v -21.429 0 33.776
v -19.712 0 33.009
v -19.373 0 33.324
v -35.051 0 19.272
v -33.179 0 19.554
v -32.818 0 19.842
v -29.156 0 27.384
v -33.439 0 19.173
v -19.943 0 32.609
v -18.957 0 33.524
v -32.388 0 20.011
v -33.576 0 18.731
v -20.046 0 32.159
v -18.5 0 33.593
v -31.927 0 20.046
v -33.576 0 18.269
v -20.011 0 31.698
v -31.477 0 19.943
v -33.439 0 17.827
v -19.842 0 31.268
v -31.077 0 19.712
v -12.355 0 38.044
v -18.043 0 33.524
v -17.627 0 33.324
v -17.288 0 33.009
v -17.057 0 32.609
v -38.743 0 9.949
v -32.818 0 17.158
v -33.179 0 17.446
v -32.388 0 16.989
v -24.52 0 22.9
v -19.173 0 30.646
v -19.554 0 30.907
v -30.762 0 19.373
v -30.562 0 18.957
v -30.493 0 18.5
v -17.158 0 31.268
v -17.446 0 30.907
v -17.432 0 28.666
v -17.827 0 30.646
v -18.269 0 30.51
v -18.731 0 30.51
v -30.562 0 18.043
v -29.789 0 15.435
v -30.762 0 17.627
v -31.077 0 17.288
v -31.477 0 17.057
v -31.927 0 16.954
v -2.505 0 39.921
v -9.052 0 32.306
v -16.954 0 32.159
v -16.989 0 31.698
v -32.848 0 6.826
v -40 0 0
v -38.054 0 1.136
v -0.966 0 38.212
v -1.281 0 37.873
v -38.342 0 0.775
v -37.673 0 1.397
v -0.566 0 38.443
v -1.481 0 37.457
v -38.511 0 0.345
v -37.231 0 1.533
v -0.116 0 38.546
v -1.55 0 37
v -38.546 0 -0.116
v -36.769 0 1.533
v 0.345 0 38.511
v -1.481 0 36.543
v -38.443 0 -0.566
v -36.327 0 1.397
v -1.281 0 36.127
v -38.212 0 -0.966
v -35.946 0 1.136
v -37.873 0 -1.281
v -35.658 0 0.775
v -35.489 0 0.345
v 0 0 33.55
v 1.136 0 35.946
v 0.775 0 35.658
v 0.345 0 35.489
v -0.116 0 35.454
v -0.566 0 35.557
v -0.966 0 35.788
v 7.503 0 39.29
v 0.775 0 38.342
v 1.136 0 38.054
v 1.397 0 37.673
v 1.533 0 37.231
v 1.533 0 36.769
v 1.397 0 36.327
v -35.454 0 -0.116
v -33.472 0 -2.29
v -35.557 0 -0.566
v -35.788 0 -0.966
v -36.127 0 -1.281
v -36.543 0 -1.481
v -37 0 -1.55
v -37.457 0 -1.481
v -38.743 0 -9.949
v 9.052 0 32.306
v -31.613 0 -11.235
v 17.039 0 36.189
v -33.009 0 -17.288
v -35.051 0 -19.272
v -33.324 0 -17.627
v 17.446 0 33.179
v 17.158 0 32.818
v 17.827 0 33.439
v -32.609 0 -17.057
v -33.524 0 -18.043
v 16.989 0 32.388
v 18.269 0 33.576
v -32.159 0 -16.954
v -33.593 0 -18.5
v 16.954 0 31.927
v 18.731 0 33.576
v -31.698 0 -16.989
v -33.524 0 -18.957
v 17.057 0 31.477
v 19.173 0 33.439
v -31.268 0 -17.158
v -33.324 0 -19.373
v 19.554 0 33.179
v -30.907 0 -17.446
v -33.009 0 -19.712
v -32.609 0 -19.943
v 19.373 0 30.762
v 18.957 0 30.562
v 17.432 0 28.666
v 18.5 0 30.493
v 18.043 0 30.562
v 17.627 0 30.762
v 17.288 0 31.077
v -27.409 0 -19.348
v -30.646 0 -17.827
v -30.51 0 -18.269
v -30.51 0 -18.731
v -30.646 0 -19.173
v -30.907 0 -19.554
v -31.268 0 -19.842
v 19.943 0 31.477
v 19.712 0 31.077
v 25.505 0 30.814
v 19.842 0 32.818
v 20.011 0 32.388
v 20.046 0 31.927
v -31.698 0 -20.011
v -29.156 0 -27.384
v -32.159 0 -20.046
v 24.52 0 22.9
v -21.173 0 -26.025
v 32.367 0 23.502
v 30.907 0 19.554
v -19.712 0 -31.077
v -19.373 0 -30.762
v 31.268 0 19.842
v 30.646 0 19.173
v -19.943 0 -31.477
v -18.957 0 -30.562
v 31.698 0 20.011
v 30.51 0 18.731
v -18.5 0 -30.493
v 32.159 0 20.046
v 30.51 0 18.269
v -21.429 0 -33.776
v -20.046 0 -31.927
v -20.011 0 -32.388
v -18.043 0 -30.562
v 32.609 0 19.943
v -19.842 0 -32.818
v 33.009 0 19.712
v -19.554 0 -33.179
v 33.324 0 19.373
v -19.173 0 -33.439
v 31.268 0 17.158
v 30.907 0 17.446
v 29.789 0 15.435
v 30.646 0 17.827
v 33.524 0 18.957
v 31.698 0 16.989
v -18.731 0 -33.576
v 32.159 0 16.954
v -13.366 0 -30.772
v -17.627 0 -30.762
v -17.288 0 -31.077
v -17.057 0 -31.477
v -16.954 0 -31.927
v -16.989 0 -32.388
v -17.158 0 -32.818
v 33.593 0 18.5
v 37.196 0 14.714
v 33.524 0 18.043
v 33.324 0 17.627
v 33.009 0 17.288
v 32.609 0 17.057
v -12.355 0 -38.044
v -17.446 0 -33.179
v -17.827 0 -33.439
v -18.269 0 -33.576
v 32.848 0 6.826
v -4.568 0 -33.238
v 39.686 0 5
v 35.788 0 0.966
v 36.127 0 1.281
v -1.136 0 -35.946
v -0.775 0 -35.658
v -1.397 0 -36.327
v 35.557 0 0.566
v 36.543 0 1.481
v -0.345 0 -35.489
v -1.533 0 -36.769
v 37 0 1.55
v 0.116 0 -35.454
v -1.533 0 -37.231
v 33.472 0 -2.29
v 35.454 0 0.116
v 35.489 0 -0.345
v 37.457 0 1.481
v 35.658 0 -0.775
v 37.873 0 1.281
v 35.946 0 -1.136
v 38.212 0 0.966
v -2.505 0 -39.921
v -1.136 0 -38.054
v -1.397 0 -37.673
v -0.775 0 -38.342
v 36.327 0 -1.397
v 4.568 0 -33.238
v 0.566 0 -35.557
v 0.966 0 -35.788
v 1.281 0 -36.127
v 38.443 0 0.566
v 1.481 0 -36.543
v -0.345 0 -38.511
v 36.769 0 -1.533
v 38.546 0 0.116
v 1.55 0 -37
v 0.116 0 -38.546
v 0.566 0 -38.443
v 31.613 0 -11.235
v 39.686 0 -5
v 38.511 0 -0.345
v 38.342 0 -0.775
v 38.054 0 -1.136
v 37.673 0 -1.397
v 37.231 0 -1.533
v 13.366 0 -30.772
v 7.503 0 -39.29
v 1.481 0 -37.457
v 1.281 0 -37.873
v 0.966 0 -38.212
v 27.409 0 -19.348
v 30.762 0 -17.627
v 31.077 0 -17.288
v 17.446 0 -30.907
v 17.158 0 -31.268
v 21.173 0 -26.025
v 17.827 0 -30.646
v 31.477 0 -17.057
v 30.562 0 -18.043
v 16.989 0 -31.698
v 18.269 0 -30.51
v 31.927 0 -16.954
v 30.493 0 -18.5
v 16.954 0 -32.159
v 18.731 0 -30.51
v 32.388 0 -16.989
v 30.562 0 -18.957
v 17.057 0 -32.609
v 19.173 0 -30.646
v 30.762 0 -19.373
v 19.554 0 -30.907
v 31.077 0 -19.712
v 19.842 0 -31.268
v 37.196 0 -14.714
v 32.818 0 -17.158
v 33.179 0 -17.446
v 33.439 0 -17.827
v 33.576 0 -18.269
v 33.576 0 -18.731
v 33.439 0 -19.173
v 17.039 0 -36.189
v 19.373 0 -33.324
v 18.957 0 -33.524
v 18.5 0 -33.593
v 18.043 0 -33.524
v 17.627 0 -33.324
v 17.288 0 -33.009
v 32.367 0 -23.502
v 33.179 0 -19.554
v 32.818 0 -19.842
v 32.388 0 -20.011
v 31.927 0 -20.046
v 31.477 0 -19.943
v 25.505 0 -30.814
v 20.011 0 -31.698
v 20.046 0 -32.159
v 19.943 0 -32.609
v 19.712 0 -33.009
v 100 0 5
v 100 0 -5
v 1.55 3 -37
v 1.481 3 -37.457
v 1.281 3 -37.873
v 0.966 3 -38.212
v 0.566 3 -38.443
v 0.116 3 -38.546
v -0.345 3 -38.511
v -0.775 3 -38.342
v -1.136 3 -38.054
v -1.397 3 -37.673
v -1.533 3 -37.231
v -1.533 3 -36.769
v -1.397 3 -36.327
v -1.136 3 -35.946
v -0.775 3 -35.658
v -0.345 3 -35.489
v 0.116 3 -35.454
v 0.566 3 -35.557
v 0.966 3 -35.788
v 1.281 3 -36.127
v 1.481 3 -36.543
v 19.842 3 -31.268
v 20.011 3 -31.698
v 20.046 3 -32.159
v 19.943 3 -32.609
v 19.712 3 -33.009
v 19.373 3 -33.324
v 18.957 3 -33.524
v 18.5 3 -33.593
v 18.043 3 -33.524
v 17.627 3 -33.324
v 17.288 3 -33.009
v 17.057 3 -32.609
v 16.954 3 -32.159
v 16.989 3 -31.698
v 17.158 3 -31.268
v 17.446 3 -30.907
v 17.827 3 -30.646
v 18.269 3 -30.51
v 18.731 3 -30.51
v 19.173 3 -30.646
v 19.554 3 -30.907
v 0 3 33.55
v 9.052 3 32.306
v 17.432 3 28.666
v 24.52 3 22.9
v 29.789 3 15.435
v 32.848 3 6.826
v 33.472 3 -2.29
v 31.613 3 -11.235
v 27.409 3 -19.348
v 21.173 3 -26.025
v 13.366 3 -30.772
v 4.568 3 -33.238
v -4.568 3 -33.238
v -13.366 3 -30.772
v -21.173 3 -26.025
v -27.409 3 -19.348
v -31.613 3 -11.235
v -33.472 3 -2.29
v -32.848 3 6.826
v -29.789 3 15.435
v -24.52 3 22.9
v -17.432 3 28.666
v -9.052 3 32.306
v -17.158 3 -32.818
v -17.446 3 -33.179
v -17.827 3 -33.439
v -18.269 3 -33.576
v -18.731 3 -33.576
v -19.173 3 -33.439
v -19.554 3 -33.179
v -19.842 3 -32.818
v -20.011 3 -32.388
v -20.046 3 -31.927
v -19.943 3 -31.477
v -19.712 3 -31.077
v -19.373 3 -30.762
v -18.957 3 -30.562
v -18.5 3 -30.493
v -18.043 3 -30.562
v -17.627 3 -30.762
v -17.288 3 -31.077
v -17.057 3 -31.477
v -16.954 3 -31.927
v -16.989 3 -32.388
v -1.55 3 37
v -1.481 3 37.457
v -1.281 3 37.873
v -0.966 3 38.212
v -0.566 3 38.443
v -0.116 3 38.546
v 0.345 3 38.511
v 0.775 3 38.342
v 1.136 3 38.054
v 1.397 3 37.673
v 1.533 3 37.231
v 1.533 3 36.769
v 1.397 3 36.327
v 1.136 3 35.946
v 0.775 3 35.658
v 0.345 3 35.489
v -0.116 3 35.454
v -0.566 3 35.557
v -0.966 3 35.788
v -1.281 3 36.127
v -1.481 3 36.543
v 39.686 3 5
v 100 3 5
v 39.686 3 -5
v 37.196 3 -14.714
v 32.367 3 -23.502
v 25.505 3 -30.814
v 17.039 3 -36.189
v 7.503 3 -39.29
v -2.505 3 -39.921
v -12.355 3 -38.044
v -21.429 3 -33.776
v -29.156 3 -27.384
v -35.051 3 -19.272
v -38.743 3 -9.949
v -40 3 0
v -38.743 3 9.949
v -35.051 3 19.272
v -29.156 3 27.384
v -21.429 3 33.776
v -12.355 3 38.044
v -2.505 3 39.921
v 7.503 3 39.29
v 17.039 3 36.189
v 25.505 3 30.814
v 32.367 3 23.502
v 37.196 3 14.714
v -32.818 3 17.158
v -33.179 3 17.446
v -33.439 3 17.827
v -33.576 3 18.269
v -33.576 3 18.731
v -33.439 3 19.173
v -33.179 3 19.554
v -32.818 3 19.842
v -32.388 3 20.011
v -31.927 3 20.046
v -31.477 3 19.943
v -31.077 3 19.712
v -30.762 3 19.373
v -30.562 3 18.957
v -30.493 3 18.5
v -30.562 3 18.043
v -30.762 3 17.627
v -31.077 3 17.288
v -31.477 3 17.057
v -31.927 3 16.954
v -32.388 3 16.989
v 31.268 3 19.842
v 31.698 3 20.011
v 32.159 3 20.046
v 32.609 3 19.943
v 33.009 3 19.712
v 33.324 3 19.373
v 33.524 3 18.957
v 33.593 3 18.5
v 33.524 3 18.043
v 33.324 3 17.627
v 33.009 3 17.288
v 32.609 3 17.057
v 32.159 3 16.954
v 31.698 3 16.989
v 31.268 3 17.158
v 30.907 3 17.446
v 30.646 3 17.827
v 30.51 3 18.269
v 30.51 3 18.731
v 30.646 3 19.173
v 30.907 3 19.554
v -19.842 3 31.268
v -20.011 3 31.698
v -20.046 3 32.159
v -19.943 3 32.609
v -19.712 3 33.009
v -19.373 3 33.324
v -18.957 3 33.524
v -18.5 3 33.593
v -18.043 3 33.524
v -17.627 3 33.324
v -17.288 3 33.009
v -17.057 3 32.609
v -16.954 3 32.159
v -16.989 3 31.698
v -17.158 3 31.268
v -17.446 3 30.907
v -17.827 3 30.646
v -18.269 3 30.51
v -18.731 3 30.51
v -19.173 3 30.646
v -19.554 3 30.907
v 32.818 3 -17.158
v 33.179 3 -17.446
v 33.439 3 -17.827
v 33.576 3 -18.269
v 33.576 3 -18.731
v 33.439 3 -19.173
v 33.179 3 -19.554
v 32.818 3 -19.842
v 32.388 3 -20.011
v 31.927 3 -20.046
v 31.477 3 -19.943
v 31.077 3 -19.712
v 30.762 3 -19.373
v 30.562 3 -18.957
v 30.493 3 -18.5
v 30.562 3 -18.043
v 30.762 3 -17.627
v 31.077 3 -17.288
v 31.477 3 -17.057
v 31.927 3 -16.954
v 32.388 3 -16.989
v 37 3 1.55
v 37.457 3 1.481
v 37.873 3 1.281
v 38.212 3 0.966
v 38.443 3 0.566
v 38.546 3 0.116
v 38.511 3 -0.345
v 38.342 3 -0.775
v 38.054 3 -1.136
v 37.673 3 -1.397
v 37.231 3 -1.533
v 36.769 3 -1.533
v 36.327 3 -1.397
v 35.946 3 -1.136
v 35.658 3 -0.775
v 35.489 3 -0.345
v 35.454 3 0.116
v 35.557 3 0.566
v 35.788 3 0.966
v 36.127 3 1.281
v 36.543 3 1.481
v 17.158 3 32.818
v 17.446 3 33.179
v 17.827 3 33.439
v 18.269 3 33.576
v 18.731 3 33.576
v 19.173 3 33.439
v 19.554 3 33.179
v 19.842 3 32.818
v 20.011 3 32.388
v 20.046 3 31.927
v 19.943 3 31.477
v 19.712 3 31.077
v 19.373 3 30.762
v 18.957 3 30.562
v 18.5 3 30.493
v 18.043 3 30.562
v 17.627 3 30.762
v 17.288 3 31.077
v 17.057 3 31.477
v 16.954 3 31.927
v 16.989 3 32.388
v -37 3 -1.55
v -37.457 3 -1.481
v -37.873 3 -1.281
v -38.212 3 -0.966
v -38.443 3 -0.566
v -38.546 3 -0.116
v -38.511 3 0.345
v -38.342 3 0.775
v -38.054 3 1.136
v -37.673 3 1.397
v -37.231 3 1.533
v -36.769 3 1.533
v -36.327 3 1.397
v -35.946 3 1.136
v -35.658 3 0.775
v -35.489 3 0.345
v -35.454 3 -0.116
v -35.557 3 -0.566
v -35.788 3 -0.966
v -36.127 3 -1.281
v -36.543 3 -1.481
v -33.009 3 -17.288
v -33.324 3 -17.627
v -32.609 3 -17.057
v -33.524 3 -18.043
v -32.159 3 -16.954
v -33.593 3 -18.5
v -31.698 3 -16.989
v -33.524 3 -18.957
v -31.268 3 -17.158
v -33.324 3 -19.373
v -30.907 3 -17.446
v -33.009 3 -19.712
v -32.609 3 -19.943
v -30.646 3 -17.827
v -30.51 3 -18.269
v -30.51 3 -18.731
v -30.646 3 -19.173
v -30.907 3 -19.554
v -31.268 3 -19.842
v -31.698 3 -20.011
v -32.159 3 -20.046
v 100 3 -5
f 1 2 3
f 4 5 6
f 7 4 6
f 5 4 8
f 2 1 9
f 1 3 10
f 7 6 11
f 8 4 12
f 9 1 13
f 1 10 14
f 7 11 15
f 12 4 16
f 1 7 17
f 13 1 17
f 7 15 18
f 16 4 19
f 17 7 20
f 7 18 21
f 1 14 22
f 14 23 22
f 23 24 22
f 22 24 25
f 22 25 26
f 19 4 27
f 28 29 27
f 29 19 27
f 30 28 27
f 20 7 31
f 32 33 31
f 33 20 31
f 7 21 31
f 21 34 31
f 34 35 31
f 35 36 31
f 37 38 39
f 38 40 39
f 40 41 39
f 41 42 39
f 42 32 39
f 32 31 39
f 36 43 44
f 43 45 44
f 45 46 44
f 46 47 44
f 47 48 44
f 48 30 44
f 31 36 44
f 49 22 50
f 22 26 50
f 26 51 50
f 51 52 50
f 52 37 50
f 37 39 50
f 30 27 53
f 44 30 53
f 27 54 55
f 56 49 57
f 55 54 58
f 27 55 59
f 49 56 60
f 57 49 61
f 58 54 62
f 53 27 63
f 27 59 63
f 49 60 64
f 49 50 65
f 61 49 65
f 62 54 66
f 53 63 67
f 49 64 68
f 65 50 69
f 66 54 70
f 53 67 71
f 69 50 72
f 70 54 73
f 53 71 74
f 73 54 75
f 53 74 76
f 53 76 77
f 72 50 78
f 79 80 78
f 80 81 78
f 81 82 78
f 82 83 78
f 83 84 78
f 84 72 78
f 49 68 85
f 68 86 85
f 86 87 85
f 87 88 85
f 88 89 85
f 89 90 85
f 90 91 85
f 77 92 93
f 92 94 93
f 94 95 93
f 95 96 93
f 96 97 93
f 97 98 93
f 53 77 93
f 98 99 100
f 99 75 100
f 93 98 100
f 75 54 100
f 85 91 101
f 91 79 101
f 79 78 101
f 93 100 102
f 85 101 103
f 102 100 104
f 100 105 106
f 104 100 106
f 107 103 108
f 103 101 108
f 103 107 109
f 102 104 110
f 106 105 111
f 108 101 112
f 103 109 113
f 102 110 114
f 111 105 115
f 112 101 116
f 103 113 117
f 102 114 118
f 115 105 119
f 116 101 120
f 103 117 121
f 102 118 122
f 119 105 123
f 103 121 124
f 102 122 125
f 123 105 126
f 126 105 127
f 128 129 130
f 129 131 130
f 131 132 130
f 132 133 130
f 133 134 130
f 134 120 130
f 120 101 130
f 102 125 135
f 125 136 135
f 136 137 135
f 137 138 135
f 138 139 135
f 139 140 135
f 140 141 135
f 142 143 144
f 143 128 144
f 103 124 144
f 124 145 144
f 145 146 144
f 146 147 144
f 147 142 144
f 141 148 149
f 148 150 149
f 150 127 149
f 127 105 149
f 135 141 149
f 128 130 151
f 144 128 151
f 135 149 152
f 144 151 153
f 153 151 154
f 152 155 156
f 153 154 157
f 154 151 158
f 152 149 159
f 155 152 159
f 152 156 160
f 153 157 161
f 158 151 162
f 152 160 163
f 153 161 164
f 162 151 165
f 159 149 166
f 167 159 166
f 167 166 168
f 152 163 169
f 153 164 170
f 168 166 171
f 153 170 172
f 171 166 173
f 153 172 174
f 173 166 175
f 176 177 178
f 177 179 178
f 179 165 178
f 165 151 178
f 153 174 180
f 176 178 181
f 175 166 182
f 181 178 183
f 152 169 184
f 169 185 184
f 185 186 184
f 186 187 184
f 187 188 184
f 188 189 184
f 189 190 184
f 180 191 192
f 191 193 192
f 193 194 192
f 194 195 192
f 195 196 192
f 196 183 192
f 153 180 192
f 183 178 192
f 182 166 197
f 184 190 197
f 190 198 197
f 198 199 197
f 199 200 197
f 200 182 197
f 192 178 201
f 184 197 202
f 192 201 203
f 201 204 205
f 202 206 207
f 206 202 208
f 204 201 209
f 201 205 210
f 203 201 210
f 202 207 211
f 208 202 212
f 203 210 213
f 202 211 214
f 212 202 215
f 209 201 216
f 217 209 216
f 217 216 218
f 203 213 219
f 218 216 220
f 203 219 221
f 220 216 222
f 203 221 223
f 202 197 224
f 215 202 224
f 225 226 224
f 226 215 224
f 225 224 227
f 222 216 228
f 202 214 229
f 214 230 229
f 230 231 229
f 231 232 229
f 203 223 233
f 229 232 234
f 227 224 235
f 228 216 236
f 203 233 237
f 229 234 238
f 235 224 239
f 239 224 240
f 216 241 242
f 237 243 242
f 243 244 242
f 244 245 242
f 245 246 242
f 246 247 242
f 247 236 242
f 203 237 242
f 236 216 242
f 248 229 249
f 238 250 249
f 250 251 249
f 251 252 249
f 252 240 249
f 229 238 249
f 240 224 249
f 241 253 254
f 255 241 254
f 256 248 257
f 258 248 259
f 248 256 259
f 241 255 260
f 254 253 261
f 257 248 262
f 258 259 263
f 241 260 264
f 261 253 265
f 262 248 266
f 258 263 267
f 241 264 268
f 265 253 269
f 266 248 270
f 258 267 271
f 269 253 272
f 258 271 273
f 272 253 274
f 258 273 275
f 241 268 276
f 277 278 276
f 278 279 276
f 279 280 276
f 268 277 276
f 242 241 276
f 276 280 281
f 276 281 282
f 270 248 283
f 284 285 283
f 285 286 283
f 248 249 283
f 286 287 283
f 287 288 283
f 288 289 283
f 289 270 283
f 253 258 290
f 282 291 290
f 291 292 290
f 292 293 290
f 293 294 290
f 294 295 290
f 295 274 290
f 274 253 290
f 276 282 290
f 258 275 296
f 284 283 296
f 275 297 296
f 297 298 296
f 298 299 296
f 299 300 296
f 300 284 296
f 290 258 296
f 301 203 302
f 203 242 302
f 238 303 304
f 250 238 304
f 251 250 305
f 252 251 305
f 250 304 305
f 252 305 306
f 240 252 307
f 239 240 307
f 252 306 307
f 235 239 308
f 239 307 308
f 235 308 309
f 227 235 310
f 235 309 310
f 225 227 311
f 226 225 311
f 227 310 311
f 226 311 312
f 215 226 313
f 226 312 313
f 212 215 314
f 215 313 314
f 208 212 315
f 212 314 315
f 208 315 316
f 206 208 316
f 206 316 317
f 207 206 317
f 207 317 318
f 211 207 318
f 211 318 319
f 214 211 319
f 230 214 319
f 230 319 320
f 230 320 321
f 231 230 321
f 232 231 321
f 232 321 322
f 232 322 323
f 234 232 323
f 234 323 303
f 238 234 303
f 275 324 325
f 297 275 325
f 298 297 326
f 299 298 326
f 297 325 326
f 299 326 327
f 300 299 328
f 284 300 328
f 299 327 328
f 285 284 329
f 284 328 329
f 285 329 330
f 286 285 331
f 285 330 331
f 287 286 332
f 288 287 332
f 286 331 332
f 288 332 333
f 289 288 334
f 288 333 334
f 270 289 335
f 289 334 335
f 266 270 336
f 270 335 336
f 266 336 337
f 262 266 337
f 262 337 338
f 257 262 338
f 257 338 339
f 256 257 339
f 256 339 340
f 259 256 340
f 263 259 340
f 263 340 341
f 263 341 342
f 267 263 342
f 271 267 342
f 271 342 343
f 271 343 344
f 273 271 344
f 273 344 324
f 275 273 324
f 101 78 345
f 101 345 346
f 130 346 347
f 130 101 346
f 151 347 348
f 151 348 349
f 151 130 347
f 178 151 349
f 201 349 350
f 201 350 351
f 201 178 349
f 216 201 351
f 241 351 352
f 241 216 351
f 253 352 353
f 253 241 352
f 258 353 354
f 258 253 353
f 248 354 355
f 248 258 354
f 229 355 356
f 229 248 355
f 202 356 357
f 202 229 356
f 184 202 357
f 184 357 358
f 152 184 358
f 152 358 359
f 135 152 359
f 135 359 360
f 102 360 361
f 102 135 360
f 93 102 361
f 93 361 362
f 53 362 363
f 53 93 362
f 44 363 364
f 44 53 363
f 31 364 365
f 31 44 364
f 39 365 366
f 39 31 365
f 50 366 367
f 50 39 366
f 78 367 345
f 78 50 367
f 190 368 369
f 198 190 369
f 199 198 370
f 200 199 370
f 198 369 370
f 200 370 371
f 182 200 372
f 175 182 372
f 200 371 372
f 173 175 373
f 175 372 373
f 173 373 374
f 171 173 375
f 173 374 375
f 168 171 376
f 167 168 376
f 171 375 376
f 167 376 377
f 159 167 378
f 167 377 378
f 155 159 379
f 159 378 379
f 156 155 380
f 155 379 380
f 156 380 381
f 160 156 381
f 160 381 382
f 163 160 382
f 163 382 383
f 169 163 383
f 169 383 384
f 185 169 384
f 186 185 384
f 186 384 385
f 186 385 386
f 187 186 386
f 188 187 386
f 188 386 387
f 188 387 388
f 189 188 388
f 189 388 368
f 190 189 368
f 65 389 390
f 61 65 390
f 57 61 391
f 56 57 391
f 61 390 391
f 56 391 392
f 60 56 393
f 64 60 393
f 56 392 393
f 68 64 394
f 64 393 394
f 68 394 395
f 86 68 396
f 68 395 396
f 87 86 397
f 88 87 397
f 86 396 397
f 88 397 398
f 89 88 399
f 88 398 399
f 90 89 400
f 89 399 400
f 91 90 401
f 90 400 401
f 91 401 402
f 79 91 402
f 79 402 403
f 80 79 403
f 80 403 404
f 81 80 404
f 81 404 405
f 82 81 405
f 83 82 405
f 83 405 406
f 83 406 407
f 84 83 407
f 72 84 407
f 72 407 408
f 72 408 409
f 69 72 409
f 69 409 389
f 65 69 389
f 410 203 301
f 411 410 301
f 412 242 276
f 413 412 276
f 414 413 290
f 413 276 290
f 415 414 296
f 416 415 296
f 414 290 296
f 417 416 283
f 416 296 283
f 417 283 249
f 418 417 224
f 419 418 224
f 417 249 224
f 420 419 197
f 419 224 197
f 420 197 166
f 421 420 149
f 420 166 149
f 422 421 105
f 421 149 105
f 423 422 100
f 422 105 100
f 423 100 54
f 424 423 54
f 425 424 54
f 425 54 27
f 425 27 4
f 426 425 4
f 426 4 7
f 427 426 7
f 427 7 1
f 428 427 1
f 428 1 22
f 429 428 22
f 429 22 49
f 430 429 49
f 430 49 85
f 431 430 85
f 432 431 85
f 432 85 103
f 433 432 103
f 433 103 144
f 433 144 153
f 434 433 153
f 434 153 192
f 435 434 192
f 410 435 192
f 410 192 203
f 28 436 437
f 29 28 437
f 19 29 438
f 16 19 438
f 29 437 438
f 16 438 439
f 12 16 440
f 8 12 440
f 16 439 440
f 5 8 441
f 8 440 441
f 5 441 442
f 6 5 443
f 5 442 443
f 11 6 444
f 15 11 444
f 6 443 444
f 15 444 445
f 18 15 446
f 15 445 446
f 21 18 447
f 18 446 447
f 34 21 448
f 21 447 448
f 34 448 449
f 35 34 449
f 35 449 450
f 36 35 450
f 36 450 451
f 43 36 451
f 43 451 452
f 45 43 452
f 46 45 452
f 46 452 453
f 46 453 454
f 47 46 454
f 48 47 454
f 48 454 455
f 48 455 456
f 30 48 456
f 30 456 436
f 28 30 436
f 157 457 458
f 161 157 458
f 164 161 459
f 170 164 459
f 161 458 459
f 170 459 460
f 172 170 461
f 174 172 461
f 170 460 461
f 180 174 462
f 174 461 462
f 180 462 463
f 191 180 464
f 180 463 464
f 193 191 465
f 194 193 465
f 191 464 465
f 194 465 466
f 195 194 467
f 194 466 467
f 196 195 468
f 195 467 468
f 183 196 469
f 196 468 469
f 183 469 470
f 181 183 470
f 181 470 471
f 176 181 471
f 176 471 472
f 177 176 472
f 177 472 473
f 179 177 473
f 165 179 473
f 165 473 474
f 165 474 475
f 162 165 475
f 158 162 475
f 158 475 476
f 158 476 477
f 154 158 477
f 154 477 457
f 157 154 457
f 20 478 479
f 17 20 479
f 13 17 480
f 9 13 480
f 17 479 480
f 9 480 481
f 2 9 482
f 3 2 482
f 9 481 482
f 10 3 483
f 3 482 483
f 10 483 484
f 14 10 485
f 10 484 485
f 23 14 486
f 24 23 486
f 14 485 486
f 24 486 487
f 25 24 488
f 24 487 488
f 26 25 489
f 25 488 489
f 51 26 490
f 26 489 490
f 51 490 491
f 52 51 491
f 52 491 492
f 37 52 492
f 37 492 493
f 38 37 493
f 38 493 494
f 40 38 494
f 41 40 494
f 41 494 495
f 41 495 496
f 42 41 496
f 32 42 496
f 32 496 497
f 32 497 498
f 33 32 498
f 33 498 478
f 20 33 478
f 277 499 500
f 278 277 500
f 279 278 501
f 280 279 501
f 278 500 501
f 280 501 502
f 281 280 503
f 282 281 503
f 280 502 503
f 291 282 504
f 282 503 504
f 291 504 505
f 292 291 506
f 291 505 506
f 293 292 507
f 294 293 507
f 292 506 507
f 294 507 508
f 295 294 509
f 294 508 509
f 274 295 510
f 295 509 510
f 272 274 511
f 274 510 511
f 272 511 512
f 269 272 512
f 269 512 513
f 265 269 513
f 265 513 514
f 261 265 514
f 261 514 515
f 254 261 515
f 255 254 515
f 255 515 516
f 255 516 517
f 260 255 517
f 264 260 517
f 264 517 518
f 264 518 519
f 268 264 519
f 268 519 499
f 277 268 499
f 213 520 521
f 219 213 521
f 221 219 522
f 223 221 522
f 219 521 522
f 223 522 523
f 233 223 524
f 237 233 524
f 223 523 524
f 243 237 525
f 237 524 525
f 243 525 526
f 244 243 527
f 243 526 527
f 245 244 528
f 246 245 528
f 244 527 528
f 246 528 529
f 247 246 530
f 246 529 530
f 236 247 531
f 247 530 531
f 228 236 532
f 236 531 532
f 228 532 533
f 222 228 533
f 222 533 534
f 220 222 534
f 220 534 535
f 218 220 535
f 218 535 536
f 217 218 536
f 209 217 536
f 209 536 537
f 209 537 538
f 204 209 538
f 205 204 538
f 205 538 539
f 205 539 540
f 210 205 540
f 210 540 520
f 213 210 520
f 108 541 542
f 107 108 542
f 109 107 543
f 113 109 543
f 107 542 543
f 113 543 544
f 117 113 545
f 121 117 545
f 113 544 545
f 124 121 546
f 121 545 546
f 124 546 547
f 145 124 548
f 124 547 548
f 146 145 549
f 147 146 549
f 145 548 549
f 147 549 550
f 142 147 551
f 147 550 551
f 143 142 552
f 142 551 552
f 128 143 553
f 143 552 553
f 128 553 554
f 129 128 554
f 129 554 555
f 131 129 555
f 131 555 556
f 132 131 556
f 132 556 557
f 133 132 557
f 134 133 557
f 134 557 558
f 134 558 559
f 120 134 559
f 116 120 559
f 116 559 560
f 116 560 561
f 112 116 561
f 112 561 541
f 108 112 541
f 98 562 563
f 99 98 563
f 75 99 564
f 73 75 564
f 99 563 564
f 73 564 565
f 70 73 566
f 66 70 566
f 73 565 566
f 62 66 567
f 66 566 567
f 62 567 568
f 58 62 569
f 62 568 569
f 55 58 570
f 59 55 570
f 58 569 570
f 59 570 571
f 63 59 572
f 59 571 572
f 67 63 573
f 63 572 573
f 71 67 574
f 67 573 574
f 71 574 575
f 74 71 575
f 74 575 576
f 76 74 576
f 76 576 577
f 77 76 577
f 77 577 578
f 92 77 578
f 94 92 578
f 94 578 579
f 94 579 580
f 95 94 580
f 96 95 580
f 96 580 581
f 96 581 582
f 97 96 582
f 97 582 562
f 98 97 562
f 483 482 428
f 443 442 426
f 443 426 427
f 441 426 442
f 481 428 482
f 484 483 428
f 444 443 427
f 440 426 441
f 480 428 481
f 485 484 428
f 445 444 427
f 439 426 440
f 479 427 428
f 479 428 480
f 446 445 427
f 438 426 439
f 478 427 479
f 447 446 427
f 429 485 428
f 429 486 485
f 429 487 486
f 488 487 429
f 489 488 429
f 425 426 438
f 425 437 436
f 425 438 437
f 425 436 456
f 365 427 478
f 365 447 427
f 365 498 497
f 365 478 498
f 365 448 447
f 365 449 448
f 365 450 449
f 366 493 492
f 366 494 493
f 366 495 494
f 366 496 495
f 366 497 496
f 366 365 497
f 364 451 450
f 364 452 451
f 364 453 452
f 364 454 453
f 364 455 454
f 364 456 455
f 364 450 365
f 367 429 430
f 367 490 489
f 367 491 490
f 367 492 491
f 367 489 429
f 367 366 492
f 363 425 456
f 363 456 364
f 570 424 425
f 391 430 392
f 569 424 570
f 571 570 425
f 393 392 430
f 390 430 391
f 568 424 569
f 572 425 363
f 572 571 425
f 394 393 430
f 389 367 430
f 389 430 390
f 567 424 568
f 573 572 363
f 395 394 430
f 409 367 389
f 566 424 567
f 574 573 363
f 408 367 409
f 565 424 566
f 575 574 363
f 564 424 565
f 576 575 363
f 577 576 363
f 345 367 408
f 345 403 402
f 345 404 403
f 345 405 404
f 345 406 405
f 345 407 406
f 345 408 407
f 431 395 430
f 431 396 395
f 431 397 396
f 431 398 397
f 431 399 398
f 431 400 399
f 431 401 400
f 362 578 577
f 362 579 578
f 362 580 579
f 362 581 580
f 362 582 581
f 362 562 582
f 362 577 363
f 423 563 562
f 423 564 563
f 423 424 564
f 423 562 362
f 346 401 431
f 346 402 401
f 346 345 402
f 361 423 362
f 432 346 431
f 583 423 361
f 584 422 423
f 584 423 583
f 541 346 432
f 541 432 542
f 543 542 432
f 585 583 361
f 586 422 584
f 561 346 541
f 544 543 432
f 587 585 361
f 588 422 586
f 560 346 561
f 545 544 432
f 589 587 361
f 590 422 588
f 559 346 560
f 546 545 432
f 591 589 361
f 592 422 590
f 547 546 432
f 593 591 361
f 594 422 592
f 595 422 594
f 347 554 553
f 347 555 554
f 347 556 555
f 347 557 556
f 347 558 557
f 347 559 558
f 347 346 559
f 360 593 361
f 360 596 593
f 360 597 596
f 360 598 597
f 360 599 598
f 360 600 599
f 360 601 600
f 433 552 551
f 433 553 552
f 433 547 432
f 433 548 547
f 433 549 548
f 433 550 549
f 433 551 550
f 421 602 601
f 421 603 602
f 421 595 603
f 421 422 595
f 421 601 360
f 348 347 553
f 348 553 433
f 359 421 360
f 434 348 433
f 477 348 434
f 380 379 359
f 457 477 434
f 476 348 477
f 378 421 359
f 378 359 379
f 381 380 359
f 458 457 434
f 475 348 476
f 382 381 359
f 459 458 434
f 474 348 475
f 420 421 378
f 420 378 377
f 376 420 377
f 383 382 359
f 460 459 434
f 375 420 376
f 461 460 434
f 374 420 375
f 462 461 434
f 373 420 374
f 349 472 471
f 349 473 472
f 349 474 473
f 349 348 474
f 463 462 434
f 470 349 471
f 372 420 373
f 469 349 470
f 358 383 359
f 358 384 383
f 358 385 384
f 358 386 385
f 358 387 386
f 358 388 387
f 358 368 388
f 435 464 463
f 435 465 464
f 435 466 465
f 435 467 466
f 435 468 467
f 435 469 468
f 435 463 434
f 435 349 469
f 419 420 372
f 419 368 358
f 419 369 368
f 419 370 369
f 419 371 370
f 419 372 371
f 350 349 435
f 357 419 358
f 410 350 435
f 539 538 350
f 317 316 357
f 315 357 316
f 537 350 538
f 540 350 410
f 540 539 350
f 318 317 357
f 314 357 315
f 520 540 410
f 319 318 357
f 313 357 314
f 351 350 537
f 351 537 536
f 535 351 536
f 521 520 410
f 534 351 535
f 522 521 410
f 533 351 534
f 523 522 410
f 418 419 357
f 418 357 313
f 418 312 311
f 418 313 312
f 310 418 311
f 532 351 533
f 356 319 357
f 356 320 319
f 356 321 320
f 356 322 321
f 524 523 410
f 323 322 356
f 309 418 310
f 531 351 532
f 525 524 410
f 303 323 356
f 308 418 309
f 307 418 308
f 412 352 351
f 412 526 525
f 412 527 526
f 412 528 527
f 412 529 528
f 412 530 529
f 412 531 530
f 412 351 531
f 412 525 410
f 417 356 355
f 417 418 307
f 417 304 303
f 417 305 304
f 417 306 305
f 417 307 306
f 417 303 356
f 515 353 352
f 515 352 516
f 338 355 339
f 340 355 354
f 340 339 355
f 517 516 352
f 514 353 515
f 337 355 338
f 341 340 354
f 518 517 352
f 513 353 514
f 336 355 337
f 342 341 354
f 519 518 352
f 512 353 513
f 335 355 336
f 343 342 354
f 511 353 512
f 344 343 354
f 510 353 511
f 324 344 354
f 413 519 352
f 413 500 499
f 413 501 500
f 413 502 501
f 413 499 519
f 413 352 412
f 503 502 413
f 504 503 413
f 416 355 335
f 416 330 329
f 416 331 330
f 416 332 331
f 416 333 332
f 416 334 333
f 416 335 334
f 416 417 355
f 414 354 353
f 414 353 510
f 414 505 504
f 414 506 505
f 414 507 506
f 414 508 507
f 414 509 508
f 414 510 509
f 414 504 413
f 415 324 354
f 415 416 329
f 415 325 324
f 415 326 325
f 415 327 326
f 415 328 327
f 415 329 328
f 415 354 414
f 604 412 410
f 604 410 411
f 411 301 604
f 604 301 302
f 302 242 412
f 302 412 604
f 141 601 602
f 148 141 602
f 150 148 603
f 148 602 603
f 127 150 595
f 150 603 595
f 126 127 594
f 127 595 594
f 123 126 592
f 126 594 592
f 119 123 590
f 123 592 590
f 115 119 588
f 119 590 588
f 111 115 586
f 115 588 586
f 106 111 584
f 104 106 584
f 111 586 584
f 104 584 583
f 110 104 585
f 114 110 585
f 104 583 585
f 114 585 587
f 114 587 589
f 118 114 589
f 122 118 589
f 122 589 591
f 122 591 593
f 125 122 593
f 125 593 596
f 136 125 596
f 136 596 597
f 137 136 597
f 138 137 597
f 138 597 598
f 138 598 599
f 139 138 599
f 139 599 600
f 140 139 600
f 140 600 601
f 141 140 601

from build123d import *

# Parameters (mm, degrees)
SKETCH1_R           = 40
SKETCH1_R_2         = 33.55
SKETCH1_W           = 60.313730334
SKETCH1_H           = 10
BOSS_EXTRUDE1_DEPTH = 3
SKETCH2_R           = 1.55
CUT_EXTRUDE1_DEPTH  = 108.745069493
CIRPATTERN1_COUNT   = 12


with BuildPart() as part:
    # Sketch1 → Boss-Extrude1 (new body)
    # profile 1 of 2: a face of its own
    with BuildSketch(Plane(origin=(0, 0, 0), x_dir=(1, 0, 0), z_dir=(0, 1, 0))):
        Circle(SKETCH1_R)
        with Locations(Location((0, 0, 0), (0, 0, 270))):
            Circle(SKETCH1_R_2, mode=Mode.SUBTRACT)
    # profile 2 of 2: a face of its own
    with BuildSketch(Plane(origin=(0, 0, 0), x_dir=(1, 0, 0), z_dir=(0, 1, 0))):
        with Locations((69.843134833, 0)):
            Rectangle(SKETCH1_W, SKETCH1_H)
    extrude(amount=BOSS_EXTRUDE1_DEPTH)

    # Sketch2 → Cut-Extrude1 (cut, through all)
    with BuildSketch(Plane(origin=(0, 3, 0), x_dir=(1, 0, 0), z_dir=(0, 1, 0))):
        with Locations(Location((37, 0, 0), (0, 0, 270))):
            Circle(SKETCH2_R)
    cut_extrude1 = extrude(amount=-CUT_EXTRUDE1_DEPTH, mode=Mode.SUBTRACT)

    # CirPattern1: Cut-Extrude1 ×12 about axis
    cirpattern1_axis = Axis((0, 0, 0), (0, 1, 0))
    for i in range(1, CIRPATTERN1_COUNT):
        add(cut_extrude1.rotate(cirpattern1_axis, i * 360 / CIRPATTERN1_COUNT), mode=Mode.SUBTRACT)


solid = part.part
